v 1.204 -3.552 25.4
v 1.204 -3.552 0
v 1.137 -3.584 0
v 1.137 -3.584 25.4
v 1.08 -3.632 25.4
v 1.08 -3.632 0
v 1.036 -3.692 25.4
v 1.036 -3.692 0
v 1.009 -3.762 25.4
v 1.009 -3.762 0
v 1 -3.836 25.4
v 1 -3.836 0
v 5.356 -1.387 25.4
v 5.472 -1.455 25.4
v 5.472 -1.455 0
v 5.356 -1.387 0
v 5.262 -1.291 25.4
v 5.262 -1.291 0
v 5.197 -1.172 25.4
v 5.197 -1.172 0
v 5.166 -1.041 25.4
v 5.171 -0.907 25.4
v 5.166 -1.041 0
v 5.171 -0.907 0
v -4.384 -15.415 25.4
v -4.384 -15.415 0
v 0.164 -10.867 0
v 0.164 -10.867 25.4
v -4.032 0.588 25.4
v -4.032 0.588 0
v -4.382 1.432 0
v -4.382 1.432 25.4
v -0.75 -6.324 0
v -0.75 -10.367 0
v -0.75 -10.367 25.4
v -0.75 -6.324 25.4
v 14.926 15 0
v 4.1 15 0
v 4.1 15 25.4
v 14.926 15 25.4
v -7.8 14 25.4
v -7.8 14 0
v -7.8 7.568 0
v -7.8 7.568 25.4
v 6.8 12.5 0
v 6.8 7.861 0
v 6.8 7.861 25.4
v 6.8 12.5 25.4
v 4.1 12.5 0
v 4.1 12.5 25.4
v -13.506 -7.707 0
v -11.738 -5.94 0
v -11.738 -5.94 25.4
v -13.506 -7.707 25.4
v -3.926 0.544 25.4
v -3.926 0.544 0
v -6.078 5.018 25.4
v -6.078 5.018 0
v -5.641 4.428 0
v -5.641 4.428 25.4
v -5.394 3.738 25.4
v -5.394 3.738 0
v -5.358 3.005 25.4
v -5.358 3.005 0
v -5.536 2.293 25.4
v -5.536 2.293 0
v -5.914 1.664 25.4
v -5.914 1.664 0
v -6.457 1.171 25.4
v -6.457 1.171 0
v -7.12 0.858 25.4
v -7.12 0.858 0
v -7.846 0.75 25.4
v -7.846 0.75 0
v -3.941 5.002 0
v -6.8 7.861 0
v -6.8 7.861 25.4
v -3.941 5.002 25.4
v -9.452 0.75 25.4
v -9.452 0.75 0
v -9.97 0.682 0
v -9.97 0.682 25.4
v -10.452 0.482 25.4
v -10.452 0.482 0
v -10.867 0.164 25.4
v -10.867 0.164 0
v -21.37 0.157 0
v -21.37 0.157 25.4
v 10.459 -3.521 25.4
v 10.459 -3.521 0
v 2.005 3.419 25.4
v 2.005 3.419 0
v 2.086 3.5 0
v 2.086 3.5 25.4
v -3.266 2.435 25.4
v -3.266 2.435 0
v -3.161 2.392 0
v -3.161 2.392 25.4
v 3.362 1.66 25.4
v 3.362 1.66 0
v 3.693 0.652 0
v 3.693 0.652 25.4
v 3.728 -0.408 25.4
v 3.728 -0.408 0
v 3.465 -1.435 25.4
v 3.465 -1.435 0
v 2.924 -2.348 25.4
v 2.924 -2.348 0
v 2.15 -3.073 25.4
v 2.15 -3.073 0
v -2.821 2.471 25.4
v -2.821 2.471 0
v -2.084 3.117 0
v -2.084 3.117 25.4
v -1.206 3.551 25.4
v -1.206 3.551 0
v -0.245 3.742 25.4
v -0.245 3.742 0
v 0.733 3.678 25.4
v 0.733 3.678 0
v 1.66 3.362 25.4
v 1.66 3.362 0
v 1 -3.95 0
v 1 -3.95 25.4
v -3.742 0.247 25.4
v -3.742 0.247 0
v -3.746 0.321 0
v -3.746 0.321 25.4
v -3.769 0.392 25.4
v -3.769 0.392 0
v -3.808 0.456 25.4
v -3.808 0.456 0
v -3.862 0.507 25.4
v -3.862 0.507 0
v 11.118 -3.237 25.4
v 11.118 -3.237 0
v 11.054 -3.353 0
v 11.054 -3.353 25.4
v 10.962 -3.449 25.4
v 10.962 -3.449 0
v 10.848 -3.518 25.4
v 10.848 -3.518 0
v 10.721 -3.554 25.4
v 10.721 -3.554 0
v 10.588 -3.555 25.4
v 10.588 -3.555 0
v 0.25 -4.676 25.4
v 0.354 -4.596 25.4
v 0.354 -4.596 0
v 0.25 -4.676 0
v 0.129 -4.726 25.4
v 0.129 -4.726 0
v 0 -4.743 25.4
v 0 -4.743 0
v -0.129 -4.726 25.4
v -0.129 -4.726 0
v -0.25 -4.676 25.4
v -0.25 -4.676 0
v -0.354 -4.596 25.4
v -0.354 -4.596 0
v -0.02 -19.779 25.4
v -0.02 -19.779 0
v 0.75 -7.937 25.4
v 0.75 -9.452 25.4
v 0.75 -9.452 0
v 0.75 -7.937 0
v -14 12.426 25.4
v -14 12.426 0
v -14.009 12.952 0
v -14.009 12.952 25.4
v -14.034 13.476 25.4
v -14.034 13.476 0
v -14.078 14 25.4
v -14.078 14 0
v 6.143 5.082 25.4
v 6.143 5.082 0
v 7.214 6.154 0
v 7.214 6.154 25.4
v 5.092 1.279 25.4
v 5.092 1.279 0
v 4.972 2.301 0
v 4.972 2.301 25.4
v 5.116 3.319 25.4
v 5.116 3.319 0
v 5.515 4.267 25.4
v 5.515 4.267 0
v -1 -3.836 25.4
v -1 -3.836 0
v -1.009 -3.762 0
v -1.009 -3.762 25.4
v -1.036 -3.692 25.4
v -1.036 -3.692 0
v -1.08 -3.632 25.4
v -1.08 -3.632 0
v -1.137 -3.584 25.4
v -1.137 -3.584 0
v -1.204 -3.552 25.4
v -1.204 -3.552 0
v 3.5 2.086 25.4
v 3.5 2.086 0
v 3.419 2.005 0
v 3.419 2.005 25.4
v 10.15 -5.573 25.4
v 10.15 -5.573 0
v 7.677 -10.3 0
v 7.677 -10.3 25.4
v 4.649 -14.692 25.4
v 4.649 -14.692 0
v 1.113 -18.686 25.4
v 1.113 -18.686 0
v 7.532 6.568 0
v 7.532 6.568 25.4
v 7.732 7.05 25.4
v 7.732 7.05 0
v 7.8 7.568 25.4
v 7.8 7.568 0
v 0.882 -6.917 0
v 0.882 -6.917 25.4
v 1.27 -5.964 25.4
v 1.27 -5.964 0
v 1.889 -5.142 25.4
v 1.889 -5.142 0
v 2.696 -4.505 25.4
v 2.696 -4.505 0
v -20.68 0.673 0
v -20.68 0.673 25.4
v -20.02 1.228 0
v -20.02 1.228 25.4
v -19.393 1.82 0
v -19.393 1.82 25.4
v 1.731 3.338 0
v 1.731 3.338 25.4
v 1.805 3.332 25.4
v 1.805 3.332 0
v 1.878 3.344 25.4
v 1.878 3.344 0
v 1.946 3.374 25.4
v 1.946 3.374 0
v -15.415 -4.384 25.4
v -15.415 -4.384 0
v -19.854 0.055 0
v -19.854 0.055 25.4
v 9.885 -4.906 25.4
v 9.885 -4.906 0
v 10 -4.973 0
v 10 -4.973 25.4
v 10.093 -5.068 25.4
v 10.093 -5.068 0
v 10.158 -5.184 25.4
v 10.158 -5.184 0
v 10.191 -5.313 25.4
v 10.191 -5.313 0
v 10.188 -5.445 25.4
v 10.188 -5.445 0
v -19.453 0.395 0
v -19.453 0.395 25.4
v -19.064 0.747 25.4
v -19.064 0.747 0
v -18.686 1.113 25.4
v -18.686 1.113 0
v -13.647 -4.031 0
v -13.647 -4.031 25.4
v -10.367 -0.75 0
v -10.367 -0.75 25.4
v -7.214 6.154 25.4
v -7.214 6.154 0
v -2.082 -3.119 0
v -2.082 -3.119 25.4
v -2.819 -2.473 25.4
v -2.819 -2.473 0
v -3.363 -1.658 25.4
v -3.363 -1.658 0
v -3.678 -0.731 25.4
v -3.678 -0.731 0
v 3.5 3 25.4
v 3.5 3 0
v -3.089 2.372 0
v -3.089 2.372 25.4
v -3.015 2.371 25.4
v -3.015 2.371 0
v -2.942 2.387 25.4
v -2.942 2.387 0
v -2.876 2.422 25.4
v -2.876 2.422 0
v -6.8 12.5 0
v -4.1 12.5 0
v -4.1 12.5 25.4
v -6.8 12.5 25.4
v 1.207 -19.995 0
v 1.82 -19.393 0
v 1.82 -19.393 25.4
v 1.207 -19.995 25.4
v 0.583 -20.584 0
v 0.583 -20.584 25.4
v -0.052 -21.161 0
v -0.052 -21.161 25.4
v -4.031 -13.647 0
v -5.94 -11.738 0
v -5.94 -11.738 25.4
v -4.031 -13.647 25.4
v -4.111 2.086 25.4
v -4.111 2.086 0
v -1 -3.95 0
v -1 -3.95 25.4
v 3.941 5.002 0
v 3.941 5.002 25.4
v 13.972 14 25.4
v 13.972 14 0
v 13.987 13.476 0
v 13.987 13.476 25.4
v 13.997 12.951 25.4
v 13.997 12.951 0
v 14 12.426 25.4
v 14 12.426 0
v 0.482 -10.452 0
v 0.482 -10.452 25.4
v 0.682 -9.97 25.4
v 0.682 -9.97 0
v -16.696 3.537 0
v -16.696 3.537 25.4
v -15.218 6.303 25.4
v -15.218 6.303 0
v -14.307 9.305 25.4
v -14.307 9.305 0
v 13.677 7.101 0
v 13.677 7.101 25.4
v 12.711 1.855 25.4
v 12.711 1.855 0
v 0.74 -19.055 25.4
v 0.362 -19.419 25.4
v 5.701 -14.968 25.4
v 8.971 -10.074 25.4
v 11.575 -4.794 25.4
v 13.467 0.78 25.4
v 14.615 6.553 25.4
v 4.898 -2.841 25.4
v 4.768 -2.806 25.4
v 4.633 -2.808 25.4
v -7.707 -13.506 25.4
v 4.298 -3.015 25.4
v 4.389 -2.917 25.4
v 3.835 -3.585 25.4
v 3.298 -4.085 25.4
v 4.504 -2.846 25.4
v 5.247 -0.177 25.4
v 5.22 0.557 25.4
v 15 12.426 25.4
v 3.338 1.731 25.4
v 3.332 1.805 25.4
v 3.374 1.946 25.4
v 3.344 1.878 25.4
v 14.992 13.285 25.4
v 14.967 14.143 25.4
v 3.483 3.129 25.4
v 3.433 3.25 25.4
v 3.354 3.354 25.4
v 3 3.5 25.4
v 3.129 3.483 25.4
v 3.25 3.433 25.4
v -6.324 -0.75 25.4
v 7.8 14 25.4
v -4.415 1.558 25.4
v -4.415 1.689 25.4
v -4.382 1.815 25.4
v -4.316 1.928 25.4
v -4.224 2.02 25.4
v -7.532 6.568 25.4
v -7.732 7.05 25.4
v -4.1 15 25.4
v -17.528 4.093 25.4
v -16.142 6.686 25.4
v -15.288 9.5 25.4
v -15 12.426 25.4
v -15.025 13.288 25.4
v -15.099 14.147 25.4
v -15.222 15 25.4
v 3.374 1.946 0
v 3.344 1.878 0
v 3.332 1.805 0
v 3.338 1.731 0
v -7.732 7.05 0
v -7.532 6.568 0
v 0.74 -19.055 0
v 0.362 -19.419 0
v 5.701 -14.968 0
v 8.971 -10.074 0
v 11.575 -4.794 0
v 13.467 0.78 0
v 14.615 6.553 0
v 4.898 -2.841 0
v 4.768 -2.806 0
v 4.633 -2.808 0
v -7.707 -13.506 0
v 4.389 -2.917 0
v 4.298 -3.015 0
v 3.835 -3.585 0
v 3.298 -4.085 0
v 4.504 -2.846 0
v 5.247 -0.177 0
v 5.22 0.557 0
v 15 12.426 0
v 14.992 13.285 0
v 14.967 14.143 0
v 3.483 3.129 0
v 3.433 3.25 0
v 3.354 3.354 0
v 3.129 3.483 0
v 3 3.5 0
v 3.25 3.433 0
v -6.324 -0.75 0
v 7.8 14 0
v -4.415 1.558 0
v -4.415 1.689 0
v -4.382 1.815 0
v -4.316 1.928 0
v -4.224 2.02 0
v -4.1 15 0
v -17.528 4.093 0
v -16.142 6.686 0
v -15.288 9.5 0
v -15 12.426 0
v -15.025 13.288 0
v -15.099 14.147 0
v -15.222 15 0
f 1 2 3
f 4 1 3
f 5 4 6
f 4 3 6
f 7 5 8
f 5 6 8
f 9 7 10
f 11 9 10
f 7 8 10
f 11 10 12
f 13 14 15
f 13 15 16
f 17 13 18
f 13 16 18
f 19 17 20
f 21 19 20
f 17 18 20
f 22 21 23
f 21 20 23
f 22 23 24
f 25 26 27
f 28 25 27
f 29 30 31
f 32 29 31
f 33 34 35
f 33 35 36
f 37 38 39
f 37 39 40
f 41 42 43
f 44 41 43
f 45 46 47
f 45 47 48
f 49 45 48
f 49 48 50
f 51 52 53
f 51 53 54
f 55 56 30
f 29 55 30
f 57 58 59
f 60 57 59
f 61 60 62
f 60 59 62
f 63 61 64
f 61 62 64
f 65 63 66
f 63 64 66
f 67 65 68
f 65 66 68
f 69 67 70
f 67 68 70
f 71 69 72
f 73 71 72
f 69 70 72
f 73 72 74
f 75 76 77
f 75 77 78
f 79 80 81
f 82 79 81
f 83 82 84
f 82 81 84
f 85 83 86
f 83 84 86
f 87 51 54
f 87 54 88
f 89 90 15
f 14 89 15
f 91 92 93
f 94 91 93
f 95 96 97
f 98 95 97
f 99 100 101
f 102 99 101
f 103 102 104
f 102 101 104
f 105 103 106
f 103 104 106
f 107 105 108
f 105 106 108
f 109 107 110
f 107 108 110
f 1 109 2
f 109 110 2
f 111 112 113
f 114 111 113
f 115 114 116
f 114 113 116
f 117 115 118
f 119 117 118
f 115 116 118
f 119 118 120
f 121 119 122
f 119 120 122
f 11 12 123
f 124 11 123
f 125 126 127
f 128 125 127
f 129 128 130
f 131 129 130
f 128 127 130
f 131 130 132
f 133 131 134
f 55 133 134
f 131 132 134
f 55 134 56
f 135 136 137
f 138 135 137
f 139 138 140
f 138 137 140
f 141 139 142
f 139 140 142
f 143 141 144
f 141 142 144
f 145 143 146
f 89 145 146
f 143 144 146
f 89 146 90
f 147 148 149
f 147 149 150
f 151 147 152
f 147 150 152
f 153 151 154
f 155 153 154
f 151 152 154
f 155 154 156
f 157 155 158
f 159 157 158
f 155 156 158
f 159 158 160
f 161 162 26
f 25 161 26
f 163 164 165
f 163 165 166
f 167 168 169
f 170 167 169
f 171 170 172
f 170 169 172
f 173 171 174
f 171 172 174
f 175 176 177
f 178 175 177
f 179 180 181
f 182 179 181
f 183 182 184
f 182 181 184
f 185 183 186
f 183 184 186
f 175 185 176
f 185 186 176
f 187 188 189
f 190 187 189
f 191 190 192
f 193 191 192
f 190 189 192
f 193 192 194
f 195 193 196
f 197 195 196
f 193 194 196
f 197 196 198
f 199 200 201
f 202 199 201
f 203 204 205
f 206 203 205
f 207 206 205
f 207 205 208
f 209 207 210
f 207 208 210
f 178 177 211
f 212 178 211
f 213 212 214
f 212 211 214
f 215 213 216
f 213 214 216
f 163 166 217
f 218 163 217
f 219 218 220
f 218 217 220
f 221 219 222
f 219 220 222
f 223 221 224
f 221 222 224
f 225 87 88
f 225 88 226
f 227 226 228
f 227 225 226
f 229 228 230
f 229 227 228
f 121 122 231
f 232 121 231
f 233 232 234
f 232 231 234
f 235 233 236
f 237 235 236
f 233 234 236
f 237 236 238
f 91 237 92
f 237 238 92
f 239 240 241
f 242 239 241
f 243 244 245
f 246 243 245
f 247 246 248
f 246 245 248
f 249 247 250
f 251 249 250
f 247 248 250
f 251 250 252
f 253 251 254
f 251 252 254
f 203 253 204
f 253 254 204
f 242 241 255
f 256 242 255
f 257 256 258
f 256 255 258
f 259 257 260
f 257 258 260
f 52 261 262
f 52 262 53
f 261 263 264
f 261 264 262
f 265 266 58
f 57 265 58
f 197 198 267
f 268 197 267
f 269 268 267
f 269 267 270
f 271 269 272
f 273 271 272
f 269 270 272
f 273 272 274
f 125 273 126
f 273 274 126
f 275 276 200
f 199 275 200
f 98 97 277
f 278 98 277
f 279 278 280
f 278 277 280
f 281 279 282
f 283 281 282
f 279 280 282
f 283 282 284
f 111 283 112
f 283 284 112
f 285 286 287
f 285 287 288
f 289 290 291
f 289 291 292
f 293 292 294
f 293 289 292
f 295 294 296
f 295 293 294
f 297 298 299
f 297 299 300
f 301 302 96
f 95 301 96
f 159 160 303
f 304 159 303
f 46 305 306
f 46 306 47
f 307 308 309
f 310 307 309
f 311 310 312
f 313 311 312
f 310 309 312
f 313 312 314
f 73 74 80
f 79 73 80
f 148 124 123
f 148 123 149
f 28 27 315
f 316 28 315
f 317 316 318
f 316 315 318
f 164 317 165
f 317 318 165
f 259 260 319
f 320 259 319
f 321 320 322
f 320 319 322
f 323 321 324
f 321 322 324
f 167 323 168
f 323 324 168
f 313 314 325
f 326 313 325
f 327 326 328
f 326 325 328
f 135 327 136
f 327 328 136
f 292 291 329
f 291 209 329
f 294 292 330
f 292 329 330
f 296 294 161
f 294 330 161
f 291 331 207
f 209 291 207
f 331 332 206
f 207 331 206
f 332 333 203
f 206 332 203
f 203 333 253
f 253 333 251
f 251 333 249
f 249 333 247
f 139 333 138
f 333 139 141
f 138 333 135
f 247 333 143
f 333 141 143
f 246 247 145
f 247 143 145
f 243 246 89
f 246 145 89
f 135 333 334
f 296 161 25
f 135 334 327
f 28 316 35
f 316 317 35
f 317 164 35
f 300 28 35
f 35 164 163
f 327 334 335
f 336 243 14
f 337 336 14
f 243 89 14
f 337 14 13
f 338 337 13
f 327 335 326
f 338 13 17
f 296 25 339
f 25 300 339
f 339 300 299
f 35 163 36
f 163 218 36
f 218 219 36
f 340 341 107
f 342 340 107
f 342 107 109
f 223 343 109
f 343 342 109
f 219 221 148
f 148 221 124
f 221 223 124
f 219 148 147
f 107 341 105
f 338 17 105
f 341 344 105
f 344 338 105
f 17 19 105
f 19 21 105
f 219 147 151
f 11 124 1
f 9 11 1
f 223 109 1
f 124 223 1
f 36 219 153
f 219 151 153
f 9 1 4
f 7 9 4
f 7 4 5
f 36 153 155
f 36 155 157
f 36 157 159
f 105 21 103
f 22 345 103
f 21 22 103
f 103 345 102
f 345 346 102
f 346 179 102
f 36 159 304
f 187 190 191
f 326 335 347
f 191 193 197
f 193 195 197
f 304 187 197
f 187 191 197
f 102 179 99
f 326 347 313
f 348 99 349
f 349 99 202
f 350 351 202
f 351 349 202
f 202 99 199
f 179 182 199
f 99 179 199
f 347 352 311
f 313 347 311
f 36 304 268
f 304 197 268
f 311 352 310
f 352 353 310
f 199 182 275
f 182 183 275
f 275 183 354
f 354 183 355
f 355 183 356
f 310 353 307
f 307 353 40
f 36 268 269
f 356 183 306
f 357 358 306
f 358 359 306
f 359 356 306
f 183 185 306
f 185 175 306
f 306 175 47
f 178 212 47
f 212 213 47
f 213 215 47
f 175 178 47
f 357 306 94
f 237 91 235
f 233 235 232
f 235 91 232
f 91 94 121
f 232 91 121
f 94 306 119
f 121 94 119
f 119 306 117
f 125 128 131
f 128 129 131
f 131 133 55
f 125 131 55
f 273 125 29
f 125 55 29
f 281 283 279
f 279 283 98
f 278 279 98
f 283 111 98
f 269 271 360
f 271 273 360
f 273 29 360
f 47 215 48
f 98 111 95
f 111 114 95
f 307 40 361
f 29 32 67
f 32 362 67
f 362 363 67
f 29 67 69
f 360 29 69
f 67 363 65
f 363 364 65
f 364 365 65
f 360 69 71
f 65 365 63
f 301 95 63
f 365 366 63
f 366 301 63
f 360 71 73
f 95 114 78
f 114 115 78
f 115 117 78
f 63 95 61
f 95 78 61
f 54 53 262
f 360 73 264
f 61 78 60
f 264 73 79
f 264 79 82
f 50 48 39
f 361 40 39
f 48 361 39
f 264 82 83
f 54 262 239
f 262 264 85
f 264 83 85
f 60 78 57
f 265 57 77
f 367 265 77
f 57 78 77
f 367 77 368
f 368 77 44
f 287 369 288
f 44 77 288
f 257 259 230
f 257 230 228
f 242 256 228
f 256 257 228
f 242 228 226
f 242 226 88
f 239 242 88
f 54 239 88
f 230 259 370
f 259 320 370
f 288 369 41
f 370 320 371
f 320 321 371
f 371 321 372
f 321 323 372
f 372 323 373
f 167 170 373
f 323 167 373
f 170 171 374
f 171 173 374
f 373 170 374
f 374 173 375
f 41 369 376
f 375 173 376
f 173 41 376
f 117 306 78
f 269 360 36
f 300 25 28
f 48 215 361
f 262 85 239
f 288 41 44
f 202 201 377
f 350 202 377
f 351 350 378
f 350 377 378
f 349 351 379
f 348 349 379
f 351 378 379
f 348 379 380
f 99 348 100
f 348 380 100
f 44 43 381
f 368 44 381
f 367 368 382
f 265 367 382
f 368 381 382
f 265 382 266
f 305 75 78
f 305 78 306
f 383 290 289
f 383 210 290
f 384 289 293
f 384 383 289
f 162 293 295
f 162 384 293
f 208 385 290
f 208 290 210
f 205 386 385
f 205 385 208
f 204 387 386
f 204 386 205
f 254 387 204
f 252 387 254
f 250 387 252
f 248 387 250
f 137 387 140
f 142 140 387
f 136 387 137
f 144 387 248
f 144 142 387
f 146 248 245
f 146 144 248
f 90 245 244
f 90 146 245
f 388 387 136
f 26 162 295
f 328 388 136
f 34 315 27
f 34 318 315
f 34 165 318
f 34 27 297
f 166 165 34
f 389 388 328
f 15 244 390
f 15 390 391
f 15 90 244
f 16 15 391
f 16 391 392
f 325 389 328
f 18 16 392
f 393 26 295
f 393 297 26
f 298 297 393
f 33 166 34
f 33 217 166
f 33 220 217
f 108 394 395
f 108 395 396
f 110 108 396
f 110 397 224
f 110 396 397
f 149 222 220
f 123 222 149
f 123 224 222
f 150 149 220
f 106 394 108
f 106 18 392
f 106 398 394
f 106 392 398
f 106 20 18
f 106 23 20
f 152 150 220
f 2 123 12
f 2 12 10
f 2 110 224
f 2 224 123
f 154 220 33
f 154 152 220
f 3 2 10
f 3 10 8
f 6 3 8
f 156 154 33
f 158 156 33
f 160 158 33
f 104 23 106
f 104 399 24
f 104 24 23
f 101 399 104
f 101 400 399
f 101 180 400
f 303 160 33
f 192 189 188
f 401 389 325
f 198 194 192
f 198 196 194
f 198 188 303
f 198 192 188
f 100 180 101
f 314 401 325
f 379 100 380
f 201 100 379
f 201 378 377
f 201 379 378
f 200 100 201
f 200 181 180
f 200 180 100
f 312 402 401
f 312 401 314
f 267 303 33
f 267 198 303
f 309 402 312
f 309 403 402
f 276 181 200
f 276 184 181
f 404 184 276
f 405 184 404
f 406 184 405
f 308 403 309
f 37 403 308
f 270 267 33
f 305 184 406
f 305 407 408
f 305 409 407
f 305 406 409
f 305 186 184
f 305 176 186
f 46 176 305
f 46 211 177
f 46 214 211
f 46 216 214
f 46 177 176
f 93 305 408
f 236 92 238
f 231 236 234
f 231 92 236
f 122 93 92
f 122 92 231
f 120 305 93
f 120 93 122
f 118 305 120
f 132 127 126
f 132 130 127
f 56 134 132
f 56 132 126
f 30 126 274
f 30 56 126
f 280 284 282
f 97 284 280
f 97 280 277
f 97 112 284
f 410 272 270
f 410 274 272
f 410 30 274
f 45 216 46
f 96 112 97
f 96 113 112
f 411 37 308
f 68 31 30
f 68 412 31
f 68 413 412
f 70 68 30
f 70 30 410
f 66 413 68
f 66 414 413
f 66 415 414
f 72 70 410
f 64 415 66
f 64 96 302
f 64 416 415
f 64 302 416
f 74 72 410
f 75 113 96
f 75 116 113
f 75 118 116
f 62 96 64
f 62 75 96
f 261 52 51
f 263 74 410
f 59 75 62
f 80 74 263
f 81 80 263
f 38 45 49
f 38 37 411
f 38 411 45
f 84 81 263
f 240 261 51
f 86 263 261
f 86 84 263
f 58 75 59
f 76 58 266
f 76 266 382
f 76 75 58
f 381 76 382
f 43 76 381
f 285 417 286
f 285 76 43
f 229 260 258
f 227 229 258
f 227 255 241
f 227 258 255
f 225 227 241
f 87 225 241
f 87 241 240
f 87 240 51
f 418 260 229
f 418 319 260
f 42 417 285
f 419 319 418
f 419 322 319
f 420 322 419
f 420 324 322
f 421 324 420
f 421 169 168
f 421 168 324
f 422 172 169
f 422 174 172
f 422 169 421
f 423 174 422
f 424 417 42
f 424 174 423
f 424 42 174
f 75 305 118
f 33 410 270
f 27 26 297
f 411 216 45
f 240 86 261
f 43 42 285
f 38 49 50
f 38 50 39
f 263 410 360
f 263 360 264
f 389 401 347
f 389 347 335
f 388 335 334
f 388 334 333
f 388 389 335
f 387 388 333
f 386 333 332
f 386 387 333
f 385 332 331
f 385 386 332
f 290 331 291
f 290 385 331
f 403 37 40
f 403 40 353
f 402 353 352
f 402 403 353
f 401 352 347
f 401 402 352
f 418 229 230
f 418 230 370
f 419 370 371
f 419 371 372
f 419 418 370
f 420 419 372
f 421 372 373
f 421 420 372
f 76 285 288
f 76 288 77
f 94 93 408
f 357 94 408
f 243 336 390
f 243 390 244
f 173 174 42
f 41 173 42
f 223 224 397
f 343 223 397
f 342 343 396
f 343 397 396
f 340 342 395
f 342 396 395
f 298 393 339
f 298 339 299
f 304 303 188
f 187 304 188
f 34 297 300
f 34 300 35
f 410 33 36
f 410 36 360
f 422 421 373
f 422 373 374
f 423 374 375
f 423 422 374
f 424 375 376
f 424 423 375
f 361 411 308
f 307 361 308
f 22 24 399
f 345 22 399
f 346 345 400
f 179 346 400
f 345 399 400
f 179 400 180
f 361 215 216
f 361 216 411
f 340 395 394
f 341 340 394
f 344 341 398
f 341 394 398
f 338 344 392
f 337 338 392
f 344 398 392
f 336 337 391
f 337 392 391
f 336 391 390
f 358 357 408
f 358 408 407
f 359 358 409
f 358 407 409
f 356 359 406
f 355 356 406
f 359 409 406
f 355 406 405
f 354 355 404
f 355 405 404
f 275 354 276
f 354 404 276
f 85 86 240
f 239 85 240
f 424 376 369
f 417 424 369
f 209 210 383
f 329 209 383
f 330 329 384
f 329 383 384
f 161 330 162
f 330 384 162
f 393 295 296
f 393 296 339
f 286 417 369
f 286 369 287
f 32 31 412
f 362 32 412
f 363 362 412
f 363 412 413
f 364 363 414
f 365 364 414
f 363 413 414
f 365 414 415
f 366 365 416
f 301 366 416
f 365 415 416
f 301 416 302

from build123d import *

# Parameters (mm, degrees)
EXTRUSION4_DEPTH = 25.4


with BuildPart() as part:
    # Sketch1 → Extrusion4 (new body)
    with BuildSketch(Plane.XY):
        with BuildLine():
            Line((-15.222428705, 14.999999974), (-4.099998637, 14.999999974))
            Line((-4.099998637, 14.999999974), (-4.099998631, 12.499999975))
            Line((-4.099998631, 12.499999975), (-6.799995581, 12.499999968))
            Line((-6.799995581, 12.499999968), (-6.79999557, 7.860655568))
            Line((-6.79999557, 7.860655568), (-3.941498133, 5.002158145))
            Line((-3.941498133, 5.002158145), (3.941497857, 5.002158165))
            Line((3.941497857, 5.002158165), (6.79999528, 7.860655602))
            Line((6.79999528, 7.860655602), (6.799995269, 12.500000002))
            Line((6.799995269, 12.500000002), (4.099998319, 12.499999995))
            Line((4.099998319, 12.499999995), (4.099998313, 14.999999995))
            Line((4.099998313, 14.999999995), (14.92634643, 15.000000022))
            ThreePointArc((14.92634643, 15.000000022), (14.981582716, 13.713730334), (14.999999839, 12.426406922))
            ThreePointArc((14.999999839, 12.426406922), (11.574578842, -4.794347555), (1.819805062, -19.393398286))
            ThreePointArc((1.819805062, -19.393398286), (0.896507077, -20.290650536), (-0.052080894, -21.161122609))
            Line((-0.052080894, -21.161122609), (-7.707465087, -13.505738454))
            Line((-7.707465087, -13.505738454), (-5.939698141, -11.7379715))
            Line((-5.939698141, -11.7379715), (-4.030511986, -13.647157645))
            Line((-4.030511986, -13.647157645), (-0.750000115, -10.366645757))
            Line((-0.750000115, -10.366645757), (-0.750000125, -6.324119927))
            Line((-0.750000125, -6.324119927), (-6.324120058, -0.75000002))
            Line((-6.324120058, -0.75000002), (-10.366645888, -0.75000003))
            Line((-10.366645888, -0.75000003), (-13.64715776, -4.030511919))
            Line((-13.64715776, -4.030511919), (-11.737971606, -5.939698064))
            Line((-11.737971606, -5.939698064), (-13.505738551, -7.707465018))
            Line((-13.505738551, -7.707465018), (-21.370484292, 0.157280684))
            ThreePointArc((-21.370484292, 0.157280684), (-20.34608634, 0.945903864), (-19.393398415, 1.819805117))
            ThreePointArc((-19.393398415, 1.819805117), (-16.141807163, 6.68615536), (-15.000000161, 12.426406848))
            ThreePointArc((-15.000000161, 12.426406848), (-15.055710753, 13.718000441), (-15.222428705, 14.999999974))
        make_face()
        with BuildLine():
            Line((-4.031774412, 0.587623385), (-4.381628794, 1.432246584))
            ThreePointArc((-4.381628794, 1.432246584), (-4.381628794, 1.814930015), (-4.111030745, 2.085528065))
            Line((-4.111030745, 2.085528065), (-3.266407566, 2.435382447))
            Line((-3.266407566, 2.435382447), (-3.161030076, 2.391733657))
            ThreePointArc((-3.161030076, 2.391733657), (-2.978032474, 2.376750688), (-2.820578756, 2.471201408))
            ThreePointArc((-2.820578756, 2.471201408), (-0.731588872, 3.677944803), (1.660186832, 3.362481109))
            ThreePointArc((1.660186832, 3.362481109), (1.841799821, 3.33547495), (2.005133821, 3.41934756))
            Line((2.005133821, 3.41934756), (2.085786261, 3.5))
            Line((2.085786261, 3.5), (2.999999821, 3.500000003))
            ThreePointArc((2.999999821, 3.500000003), (3.353553212, 3.353553393), (3.499999822, 3.000000004))
            Line((3.499999822, 3.000000004), (3.499999825, 2.085786444))
            Line((3.499999825, 2.085786444), (3.419347385, 2.005134004))
            ThreePointArc((3.419347385, 2.005134004), (3.335474775, 1.841800003), (3.362480936, 1.660187013))
            ThreePointArc((3.362480936, 1.660187013), (3.464548079, -1.435062852), (1.203703559, -3.551562652))
            ThreePointArc((1.203703559, -3.551562652), (1.056187548, -3.660886193), (0.999999859, -3.835687662))
            Line((0.999999859, -3.835687662), (0.99999986, -3.949747432))
            Line((0.99999986, -3.949747432), (0.353553251, -4.596194044))
            ThreePointArc((0.353553251, -4.596194044), (-1.38e-07, -4.742640655), (-0.353553529, -4.596194046))
            Line((-0.353553529, -4.596194046), (-1.00000014, -3.949747437))
            Line((-1.00000014, -3.949747437), (-1.000000141, -3.835687667))
            ThreePointArc((-1.000000141, -3.835687667), (-1.056187824, -3.660886194), (-1.203703841, -3.551562658))
            ThreePointArc((-1.203703841, -3.551562658), (-3.118011196, -2.083388382), (-3.741853671, 0.247046976))
            ThreePointArc((-3.741853671, 0.247046976), (-3.786403511, 0.425170315), (-3.926396922, 0.543974595))
            Line((-3.926396922, 0.543974595), (-4.031774412, 0.587623385))
        make_face(mode=Mode.SUBTRACT)
        with BuildLine():
            Line((7.799995261, 7.567762394), (7.799995245, 14.000000024))
            Line((7.799995245, 14.000000024), (13.971852229, 14.00000004))
            ThreePointArc((13.971852229, 14.00000004), (13.992962358, 13.213329344), (13.999999819, 12.426406924))
            ThreePointArc((13.999999819, 12.426406924), (13.273442442, 4.463419684), (11.117765058, -3.236587227))
            ThreePointArc((11.117765058, -3.236587227), (10.848477439, -3.517741288), (10.459176009, -3.520538429))
            Line((10.459176009, -3.520538429), (5.472273453, -1.454895771))
            ThreePointArc((5.472273453, -1.454895771), (5.225369073, -1.233664041), (5.171126882, -0.906612002))
            ThreePointArc((5.171126882, -0.906612002), (5.246544564, 0.190443263), (5.091786587, 1.279143428))
            ThreePointArc((5.091786587, 1.279143428), (5.115772732, 3.31925596), (6.142816007, 5.08215601))
            Line((6.142816007, 5.08215601), (7.214208825, 6.153548833))
            ThreePointArc((7.214208825, 6.153548833), (7.647754322, 6.802395532), (7.799995261, 7.567762394))
        make_face(mode=Mode.SUBTRACT)
        with BuildLine():
            Line((0.749999883, -9.452432163), (0.749999879, -7.937253913))
            ThreePointArc((0.749999879, -7.937253913), (1.270329188, -5.964466066), (2.695945821, -4.504927888))
            ThreePointArc((2.695945821, -4.504927888), (3.575203493, -3.84453103), (4.297610347, -3.01546746))
            ThreePointArc((4.297610347, -3.01546746), (4.567226078, -2.822561759), (4.898248297, -2.840715069))
            Line((4.898248297, -2.840715069), (9.885150852, -4.906357727))
            ThreePointArc((9.885150852, -4.906357727), (10.158450647, -5.183613277), (10.150059814, -5.57283431))
            ThreePointArc((10.150059814, -5.57283431), (6.229626845, -12.541855522), (1.112698256, -18.686291472))
            ThreePointArc((1.112698256, -18.686291472), (0.551283843, -19.237753416), (-0.019903451, -19.779086485))
            Line((-0.019903451, -19.779086485), (-4.384065382, -15.414924576))
            Line((-4.384065382, -15.414924576), (0.164213447, -10.866645724))
            ThreePointArc((0.164213447, -10.866645724), (0.597758953, -10.217799029), (0.749999883, -9.452432163))
        make_face(mode=Mode.SUBTRACT)
        with BuildLine():
            Line((-14.07756929, 13.99999997), (-7.799995595, 13.999999986))
            Line((-7.799995595, 13.999999986), (-7.799995579, 7.567762366))
            ThreePointArc((-7.799995579, 7.567762366), (-7.647754645, 6.802395501), (-7.214209135, 6.153548807))
            Line((-7.214209135, 6.153548807), (-6.078427273, 5.01776695))
            ThreePointArc((-6.078427273, 5.01776695), (-5.536495387, 2.29329142), (-7.846194212, 0.749999996))
            Line((-7.846194212, 0.749999996), (-9.452432322, 0.749999992))
            ThreePointArc((-9.452432322, 0.749999992), (-10.217799187, 0.597759058), (-10.866645881, 0.164213548))
            Line((-10.866645881, 0.164213548), (-15.414924709, -4.384065303))
            Line((-15.414924709, -4.384065303), (-19.853839651, 0.054849617))
            ThreePointArc((-19.853839651, 0.054849617), (-19.257037077, 0.569394344), (-18.686291624, 1.112698328))
            ThreePointArc((-18.686291624, 1.112698328), (-15.217927205, 6.303472924), (-14.000000151, 12.426409013))
            ThreePointArc((-14.000000151, 12.426409013), (-14.019404256, 13.214159839), (-14.07756929, 13.99999997))
        make_face(mode=Mode.SUBTRACT)
    extrude(amount=EXTRUSION4_DEPTH)


solid = part.part
